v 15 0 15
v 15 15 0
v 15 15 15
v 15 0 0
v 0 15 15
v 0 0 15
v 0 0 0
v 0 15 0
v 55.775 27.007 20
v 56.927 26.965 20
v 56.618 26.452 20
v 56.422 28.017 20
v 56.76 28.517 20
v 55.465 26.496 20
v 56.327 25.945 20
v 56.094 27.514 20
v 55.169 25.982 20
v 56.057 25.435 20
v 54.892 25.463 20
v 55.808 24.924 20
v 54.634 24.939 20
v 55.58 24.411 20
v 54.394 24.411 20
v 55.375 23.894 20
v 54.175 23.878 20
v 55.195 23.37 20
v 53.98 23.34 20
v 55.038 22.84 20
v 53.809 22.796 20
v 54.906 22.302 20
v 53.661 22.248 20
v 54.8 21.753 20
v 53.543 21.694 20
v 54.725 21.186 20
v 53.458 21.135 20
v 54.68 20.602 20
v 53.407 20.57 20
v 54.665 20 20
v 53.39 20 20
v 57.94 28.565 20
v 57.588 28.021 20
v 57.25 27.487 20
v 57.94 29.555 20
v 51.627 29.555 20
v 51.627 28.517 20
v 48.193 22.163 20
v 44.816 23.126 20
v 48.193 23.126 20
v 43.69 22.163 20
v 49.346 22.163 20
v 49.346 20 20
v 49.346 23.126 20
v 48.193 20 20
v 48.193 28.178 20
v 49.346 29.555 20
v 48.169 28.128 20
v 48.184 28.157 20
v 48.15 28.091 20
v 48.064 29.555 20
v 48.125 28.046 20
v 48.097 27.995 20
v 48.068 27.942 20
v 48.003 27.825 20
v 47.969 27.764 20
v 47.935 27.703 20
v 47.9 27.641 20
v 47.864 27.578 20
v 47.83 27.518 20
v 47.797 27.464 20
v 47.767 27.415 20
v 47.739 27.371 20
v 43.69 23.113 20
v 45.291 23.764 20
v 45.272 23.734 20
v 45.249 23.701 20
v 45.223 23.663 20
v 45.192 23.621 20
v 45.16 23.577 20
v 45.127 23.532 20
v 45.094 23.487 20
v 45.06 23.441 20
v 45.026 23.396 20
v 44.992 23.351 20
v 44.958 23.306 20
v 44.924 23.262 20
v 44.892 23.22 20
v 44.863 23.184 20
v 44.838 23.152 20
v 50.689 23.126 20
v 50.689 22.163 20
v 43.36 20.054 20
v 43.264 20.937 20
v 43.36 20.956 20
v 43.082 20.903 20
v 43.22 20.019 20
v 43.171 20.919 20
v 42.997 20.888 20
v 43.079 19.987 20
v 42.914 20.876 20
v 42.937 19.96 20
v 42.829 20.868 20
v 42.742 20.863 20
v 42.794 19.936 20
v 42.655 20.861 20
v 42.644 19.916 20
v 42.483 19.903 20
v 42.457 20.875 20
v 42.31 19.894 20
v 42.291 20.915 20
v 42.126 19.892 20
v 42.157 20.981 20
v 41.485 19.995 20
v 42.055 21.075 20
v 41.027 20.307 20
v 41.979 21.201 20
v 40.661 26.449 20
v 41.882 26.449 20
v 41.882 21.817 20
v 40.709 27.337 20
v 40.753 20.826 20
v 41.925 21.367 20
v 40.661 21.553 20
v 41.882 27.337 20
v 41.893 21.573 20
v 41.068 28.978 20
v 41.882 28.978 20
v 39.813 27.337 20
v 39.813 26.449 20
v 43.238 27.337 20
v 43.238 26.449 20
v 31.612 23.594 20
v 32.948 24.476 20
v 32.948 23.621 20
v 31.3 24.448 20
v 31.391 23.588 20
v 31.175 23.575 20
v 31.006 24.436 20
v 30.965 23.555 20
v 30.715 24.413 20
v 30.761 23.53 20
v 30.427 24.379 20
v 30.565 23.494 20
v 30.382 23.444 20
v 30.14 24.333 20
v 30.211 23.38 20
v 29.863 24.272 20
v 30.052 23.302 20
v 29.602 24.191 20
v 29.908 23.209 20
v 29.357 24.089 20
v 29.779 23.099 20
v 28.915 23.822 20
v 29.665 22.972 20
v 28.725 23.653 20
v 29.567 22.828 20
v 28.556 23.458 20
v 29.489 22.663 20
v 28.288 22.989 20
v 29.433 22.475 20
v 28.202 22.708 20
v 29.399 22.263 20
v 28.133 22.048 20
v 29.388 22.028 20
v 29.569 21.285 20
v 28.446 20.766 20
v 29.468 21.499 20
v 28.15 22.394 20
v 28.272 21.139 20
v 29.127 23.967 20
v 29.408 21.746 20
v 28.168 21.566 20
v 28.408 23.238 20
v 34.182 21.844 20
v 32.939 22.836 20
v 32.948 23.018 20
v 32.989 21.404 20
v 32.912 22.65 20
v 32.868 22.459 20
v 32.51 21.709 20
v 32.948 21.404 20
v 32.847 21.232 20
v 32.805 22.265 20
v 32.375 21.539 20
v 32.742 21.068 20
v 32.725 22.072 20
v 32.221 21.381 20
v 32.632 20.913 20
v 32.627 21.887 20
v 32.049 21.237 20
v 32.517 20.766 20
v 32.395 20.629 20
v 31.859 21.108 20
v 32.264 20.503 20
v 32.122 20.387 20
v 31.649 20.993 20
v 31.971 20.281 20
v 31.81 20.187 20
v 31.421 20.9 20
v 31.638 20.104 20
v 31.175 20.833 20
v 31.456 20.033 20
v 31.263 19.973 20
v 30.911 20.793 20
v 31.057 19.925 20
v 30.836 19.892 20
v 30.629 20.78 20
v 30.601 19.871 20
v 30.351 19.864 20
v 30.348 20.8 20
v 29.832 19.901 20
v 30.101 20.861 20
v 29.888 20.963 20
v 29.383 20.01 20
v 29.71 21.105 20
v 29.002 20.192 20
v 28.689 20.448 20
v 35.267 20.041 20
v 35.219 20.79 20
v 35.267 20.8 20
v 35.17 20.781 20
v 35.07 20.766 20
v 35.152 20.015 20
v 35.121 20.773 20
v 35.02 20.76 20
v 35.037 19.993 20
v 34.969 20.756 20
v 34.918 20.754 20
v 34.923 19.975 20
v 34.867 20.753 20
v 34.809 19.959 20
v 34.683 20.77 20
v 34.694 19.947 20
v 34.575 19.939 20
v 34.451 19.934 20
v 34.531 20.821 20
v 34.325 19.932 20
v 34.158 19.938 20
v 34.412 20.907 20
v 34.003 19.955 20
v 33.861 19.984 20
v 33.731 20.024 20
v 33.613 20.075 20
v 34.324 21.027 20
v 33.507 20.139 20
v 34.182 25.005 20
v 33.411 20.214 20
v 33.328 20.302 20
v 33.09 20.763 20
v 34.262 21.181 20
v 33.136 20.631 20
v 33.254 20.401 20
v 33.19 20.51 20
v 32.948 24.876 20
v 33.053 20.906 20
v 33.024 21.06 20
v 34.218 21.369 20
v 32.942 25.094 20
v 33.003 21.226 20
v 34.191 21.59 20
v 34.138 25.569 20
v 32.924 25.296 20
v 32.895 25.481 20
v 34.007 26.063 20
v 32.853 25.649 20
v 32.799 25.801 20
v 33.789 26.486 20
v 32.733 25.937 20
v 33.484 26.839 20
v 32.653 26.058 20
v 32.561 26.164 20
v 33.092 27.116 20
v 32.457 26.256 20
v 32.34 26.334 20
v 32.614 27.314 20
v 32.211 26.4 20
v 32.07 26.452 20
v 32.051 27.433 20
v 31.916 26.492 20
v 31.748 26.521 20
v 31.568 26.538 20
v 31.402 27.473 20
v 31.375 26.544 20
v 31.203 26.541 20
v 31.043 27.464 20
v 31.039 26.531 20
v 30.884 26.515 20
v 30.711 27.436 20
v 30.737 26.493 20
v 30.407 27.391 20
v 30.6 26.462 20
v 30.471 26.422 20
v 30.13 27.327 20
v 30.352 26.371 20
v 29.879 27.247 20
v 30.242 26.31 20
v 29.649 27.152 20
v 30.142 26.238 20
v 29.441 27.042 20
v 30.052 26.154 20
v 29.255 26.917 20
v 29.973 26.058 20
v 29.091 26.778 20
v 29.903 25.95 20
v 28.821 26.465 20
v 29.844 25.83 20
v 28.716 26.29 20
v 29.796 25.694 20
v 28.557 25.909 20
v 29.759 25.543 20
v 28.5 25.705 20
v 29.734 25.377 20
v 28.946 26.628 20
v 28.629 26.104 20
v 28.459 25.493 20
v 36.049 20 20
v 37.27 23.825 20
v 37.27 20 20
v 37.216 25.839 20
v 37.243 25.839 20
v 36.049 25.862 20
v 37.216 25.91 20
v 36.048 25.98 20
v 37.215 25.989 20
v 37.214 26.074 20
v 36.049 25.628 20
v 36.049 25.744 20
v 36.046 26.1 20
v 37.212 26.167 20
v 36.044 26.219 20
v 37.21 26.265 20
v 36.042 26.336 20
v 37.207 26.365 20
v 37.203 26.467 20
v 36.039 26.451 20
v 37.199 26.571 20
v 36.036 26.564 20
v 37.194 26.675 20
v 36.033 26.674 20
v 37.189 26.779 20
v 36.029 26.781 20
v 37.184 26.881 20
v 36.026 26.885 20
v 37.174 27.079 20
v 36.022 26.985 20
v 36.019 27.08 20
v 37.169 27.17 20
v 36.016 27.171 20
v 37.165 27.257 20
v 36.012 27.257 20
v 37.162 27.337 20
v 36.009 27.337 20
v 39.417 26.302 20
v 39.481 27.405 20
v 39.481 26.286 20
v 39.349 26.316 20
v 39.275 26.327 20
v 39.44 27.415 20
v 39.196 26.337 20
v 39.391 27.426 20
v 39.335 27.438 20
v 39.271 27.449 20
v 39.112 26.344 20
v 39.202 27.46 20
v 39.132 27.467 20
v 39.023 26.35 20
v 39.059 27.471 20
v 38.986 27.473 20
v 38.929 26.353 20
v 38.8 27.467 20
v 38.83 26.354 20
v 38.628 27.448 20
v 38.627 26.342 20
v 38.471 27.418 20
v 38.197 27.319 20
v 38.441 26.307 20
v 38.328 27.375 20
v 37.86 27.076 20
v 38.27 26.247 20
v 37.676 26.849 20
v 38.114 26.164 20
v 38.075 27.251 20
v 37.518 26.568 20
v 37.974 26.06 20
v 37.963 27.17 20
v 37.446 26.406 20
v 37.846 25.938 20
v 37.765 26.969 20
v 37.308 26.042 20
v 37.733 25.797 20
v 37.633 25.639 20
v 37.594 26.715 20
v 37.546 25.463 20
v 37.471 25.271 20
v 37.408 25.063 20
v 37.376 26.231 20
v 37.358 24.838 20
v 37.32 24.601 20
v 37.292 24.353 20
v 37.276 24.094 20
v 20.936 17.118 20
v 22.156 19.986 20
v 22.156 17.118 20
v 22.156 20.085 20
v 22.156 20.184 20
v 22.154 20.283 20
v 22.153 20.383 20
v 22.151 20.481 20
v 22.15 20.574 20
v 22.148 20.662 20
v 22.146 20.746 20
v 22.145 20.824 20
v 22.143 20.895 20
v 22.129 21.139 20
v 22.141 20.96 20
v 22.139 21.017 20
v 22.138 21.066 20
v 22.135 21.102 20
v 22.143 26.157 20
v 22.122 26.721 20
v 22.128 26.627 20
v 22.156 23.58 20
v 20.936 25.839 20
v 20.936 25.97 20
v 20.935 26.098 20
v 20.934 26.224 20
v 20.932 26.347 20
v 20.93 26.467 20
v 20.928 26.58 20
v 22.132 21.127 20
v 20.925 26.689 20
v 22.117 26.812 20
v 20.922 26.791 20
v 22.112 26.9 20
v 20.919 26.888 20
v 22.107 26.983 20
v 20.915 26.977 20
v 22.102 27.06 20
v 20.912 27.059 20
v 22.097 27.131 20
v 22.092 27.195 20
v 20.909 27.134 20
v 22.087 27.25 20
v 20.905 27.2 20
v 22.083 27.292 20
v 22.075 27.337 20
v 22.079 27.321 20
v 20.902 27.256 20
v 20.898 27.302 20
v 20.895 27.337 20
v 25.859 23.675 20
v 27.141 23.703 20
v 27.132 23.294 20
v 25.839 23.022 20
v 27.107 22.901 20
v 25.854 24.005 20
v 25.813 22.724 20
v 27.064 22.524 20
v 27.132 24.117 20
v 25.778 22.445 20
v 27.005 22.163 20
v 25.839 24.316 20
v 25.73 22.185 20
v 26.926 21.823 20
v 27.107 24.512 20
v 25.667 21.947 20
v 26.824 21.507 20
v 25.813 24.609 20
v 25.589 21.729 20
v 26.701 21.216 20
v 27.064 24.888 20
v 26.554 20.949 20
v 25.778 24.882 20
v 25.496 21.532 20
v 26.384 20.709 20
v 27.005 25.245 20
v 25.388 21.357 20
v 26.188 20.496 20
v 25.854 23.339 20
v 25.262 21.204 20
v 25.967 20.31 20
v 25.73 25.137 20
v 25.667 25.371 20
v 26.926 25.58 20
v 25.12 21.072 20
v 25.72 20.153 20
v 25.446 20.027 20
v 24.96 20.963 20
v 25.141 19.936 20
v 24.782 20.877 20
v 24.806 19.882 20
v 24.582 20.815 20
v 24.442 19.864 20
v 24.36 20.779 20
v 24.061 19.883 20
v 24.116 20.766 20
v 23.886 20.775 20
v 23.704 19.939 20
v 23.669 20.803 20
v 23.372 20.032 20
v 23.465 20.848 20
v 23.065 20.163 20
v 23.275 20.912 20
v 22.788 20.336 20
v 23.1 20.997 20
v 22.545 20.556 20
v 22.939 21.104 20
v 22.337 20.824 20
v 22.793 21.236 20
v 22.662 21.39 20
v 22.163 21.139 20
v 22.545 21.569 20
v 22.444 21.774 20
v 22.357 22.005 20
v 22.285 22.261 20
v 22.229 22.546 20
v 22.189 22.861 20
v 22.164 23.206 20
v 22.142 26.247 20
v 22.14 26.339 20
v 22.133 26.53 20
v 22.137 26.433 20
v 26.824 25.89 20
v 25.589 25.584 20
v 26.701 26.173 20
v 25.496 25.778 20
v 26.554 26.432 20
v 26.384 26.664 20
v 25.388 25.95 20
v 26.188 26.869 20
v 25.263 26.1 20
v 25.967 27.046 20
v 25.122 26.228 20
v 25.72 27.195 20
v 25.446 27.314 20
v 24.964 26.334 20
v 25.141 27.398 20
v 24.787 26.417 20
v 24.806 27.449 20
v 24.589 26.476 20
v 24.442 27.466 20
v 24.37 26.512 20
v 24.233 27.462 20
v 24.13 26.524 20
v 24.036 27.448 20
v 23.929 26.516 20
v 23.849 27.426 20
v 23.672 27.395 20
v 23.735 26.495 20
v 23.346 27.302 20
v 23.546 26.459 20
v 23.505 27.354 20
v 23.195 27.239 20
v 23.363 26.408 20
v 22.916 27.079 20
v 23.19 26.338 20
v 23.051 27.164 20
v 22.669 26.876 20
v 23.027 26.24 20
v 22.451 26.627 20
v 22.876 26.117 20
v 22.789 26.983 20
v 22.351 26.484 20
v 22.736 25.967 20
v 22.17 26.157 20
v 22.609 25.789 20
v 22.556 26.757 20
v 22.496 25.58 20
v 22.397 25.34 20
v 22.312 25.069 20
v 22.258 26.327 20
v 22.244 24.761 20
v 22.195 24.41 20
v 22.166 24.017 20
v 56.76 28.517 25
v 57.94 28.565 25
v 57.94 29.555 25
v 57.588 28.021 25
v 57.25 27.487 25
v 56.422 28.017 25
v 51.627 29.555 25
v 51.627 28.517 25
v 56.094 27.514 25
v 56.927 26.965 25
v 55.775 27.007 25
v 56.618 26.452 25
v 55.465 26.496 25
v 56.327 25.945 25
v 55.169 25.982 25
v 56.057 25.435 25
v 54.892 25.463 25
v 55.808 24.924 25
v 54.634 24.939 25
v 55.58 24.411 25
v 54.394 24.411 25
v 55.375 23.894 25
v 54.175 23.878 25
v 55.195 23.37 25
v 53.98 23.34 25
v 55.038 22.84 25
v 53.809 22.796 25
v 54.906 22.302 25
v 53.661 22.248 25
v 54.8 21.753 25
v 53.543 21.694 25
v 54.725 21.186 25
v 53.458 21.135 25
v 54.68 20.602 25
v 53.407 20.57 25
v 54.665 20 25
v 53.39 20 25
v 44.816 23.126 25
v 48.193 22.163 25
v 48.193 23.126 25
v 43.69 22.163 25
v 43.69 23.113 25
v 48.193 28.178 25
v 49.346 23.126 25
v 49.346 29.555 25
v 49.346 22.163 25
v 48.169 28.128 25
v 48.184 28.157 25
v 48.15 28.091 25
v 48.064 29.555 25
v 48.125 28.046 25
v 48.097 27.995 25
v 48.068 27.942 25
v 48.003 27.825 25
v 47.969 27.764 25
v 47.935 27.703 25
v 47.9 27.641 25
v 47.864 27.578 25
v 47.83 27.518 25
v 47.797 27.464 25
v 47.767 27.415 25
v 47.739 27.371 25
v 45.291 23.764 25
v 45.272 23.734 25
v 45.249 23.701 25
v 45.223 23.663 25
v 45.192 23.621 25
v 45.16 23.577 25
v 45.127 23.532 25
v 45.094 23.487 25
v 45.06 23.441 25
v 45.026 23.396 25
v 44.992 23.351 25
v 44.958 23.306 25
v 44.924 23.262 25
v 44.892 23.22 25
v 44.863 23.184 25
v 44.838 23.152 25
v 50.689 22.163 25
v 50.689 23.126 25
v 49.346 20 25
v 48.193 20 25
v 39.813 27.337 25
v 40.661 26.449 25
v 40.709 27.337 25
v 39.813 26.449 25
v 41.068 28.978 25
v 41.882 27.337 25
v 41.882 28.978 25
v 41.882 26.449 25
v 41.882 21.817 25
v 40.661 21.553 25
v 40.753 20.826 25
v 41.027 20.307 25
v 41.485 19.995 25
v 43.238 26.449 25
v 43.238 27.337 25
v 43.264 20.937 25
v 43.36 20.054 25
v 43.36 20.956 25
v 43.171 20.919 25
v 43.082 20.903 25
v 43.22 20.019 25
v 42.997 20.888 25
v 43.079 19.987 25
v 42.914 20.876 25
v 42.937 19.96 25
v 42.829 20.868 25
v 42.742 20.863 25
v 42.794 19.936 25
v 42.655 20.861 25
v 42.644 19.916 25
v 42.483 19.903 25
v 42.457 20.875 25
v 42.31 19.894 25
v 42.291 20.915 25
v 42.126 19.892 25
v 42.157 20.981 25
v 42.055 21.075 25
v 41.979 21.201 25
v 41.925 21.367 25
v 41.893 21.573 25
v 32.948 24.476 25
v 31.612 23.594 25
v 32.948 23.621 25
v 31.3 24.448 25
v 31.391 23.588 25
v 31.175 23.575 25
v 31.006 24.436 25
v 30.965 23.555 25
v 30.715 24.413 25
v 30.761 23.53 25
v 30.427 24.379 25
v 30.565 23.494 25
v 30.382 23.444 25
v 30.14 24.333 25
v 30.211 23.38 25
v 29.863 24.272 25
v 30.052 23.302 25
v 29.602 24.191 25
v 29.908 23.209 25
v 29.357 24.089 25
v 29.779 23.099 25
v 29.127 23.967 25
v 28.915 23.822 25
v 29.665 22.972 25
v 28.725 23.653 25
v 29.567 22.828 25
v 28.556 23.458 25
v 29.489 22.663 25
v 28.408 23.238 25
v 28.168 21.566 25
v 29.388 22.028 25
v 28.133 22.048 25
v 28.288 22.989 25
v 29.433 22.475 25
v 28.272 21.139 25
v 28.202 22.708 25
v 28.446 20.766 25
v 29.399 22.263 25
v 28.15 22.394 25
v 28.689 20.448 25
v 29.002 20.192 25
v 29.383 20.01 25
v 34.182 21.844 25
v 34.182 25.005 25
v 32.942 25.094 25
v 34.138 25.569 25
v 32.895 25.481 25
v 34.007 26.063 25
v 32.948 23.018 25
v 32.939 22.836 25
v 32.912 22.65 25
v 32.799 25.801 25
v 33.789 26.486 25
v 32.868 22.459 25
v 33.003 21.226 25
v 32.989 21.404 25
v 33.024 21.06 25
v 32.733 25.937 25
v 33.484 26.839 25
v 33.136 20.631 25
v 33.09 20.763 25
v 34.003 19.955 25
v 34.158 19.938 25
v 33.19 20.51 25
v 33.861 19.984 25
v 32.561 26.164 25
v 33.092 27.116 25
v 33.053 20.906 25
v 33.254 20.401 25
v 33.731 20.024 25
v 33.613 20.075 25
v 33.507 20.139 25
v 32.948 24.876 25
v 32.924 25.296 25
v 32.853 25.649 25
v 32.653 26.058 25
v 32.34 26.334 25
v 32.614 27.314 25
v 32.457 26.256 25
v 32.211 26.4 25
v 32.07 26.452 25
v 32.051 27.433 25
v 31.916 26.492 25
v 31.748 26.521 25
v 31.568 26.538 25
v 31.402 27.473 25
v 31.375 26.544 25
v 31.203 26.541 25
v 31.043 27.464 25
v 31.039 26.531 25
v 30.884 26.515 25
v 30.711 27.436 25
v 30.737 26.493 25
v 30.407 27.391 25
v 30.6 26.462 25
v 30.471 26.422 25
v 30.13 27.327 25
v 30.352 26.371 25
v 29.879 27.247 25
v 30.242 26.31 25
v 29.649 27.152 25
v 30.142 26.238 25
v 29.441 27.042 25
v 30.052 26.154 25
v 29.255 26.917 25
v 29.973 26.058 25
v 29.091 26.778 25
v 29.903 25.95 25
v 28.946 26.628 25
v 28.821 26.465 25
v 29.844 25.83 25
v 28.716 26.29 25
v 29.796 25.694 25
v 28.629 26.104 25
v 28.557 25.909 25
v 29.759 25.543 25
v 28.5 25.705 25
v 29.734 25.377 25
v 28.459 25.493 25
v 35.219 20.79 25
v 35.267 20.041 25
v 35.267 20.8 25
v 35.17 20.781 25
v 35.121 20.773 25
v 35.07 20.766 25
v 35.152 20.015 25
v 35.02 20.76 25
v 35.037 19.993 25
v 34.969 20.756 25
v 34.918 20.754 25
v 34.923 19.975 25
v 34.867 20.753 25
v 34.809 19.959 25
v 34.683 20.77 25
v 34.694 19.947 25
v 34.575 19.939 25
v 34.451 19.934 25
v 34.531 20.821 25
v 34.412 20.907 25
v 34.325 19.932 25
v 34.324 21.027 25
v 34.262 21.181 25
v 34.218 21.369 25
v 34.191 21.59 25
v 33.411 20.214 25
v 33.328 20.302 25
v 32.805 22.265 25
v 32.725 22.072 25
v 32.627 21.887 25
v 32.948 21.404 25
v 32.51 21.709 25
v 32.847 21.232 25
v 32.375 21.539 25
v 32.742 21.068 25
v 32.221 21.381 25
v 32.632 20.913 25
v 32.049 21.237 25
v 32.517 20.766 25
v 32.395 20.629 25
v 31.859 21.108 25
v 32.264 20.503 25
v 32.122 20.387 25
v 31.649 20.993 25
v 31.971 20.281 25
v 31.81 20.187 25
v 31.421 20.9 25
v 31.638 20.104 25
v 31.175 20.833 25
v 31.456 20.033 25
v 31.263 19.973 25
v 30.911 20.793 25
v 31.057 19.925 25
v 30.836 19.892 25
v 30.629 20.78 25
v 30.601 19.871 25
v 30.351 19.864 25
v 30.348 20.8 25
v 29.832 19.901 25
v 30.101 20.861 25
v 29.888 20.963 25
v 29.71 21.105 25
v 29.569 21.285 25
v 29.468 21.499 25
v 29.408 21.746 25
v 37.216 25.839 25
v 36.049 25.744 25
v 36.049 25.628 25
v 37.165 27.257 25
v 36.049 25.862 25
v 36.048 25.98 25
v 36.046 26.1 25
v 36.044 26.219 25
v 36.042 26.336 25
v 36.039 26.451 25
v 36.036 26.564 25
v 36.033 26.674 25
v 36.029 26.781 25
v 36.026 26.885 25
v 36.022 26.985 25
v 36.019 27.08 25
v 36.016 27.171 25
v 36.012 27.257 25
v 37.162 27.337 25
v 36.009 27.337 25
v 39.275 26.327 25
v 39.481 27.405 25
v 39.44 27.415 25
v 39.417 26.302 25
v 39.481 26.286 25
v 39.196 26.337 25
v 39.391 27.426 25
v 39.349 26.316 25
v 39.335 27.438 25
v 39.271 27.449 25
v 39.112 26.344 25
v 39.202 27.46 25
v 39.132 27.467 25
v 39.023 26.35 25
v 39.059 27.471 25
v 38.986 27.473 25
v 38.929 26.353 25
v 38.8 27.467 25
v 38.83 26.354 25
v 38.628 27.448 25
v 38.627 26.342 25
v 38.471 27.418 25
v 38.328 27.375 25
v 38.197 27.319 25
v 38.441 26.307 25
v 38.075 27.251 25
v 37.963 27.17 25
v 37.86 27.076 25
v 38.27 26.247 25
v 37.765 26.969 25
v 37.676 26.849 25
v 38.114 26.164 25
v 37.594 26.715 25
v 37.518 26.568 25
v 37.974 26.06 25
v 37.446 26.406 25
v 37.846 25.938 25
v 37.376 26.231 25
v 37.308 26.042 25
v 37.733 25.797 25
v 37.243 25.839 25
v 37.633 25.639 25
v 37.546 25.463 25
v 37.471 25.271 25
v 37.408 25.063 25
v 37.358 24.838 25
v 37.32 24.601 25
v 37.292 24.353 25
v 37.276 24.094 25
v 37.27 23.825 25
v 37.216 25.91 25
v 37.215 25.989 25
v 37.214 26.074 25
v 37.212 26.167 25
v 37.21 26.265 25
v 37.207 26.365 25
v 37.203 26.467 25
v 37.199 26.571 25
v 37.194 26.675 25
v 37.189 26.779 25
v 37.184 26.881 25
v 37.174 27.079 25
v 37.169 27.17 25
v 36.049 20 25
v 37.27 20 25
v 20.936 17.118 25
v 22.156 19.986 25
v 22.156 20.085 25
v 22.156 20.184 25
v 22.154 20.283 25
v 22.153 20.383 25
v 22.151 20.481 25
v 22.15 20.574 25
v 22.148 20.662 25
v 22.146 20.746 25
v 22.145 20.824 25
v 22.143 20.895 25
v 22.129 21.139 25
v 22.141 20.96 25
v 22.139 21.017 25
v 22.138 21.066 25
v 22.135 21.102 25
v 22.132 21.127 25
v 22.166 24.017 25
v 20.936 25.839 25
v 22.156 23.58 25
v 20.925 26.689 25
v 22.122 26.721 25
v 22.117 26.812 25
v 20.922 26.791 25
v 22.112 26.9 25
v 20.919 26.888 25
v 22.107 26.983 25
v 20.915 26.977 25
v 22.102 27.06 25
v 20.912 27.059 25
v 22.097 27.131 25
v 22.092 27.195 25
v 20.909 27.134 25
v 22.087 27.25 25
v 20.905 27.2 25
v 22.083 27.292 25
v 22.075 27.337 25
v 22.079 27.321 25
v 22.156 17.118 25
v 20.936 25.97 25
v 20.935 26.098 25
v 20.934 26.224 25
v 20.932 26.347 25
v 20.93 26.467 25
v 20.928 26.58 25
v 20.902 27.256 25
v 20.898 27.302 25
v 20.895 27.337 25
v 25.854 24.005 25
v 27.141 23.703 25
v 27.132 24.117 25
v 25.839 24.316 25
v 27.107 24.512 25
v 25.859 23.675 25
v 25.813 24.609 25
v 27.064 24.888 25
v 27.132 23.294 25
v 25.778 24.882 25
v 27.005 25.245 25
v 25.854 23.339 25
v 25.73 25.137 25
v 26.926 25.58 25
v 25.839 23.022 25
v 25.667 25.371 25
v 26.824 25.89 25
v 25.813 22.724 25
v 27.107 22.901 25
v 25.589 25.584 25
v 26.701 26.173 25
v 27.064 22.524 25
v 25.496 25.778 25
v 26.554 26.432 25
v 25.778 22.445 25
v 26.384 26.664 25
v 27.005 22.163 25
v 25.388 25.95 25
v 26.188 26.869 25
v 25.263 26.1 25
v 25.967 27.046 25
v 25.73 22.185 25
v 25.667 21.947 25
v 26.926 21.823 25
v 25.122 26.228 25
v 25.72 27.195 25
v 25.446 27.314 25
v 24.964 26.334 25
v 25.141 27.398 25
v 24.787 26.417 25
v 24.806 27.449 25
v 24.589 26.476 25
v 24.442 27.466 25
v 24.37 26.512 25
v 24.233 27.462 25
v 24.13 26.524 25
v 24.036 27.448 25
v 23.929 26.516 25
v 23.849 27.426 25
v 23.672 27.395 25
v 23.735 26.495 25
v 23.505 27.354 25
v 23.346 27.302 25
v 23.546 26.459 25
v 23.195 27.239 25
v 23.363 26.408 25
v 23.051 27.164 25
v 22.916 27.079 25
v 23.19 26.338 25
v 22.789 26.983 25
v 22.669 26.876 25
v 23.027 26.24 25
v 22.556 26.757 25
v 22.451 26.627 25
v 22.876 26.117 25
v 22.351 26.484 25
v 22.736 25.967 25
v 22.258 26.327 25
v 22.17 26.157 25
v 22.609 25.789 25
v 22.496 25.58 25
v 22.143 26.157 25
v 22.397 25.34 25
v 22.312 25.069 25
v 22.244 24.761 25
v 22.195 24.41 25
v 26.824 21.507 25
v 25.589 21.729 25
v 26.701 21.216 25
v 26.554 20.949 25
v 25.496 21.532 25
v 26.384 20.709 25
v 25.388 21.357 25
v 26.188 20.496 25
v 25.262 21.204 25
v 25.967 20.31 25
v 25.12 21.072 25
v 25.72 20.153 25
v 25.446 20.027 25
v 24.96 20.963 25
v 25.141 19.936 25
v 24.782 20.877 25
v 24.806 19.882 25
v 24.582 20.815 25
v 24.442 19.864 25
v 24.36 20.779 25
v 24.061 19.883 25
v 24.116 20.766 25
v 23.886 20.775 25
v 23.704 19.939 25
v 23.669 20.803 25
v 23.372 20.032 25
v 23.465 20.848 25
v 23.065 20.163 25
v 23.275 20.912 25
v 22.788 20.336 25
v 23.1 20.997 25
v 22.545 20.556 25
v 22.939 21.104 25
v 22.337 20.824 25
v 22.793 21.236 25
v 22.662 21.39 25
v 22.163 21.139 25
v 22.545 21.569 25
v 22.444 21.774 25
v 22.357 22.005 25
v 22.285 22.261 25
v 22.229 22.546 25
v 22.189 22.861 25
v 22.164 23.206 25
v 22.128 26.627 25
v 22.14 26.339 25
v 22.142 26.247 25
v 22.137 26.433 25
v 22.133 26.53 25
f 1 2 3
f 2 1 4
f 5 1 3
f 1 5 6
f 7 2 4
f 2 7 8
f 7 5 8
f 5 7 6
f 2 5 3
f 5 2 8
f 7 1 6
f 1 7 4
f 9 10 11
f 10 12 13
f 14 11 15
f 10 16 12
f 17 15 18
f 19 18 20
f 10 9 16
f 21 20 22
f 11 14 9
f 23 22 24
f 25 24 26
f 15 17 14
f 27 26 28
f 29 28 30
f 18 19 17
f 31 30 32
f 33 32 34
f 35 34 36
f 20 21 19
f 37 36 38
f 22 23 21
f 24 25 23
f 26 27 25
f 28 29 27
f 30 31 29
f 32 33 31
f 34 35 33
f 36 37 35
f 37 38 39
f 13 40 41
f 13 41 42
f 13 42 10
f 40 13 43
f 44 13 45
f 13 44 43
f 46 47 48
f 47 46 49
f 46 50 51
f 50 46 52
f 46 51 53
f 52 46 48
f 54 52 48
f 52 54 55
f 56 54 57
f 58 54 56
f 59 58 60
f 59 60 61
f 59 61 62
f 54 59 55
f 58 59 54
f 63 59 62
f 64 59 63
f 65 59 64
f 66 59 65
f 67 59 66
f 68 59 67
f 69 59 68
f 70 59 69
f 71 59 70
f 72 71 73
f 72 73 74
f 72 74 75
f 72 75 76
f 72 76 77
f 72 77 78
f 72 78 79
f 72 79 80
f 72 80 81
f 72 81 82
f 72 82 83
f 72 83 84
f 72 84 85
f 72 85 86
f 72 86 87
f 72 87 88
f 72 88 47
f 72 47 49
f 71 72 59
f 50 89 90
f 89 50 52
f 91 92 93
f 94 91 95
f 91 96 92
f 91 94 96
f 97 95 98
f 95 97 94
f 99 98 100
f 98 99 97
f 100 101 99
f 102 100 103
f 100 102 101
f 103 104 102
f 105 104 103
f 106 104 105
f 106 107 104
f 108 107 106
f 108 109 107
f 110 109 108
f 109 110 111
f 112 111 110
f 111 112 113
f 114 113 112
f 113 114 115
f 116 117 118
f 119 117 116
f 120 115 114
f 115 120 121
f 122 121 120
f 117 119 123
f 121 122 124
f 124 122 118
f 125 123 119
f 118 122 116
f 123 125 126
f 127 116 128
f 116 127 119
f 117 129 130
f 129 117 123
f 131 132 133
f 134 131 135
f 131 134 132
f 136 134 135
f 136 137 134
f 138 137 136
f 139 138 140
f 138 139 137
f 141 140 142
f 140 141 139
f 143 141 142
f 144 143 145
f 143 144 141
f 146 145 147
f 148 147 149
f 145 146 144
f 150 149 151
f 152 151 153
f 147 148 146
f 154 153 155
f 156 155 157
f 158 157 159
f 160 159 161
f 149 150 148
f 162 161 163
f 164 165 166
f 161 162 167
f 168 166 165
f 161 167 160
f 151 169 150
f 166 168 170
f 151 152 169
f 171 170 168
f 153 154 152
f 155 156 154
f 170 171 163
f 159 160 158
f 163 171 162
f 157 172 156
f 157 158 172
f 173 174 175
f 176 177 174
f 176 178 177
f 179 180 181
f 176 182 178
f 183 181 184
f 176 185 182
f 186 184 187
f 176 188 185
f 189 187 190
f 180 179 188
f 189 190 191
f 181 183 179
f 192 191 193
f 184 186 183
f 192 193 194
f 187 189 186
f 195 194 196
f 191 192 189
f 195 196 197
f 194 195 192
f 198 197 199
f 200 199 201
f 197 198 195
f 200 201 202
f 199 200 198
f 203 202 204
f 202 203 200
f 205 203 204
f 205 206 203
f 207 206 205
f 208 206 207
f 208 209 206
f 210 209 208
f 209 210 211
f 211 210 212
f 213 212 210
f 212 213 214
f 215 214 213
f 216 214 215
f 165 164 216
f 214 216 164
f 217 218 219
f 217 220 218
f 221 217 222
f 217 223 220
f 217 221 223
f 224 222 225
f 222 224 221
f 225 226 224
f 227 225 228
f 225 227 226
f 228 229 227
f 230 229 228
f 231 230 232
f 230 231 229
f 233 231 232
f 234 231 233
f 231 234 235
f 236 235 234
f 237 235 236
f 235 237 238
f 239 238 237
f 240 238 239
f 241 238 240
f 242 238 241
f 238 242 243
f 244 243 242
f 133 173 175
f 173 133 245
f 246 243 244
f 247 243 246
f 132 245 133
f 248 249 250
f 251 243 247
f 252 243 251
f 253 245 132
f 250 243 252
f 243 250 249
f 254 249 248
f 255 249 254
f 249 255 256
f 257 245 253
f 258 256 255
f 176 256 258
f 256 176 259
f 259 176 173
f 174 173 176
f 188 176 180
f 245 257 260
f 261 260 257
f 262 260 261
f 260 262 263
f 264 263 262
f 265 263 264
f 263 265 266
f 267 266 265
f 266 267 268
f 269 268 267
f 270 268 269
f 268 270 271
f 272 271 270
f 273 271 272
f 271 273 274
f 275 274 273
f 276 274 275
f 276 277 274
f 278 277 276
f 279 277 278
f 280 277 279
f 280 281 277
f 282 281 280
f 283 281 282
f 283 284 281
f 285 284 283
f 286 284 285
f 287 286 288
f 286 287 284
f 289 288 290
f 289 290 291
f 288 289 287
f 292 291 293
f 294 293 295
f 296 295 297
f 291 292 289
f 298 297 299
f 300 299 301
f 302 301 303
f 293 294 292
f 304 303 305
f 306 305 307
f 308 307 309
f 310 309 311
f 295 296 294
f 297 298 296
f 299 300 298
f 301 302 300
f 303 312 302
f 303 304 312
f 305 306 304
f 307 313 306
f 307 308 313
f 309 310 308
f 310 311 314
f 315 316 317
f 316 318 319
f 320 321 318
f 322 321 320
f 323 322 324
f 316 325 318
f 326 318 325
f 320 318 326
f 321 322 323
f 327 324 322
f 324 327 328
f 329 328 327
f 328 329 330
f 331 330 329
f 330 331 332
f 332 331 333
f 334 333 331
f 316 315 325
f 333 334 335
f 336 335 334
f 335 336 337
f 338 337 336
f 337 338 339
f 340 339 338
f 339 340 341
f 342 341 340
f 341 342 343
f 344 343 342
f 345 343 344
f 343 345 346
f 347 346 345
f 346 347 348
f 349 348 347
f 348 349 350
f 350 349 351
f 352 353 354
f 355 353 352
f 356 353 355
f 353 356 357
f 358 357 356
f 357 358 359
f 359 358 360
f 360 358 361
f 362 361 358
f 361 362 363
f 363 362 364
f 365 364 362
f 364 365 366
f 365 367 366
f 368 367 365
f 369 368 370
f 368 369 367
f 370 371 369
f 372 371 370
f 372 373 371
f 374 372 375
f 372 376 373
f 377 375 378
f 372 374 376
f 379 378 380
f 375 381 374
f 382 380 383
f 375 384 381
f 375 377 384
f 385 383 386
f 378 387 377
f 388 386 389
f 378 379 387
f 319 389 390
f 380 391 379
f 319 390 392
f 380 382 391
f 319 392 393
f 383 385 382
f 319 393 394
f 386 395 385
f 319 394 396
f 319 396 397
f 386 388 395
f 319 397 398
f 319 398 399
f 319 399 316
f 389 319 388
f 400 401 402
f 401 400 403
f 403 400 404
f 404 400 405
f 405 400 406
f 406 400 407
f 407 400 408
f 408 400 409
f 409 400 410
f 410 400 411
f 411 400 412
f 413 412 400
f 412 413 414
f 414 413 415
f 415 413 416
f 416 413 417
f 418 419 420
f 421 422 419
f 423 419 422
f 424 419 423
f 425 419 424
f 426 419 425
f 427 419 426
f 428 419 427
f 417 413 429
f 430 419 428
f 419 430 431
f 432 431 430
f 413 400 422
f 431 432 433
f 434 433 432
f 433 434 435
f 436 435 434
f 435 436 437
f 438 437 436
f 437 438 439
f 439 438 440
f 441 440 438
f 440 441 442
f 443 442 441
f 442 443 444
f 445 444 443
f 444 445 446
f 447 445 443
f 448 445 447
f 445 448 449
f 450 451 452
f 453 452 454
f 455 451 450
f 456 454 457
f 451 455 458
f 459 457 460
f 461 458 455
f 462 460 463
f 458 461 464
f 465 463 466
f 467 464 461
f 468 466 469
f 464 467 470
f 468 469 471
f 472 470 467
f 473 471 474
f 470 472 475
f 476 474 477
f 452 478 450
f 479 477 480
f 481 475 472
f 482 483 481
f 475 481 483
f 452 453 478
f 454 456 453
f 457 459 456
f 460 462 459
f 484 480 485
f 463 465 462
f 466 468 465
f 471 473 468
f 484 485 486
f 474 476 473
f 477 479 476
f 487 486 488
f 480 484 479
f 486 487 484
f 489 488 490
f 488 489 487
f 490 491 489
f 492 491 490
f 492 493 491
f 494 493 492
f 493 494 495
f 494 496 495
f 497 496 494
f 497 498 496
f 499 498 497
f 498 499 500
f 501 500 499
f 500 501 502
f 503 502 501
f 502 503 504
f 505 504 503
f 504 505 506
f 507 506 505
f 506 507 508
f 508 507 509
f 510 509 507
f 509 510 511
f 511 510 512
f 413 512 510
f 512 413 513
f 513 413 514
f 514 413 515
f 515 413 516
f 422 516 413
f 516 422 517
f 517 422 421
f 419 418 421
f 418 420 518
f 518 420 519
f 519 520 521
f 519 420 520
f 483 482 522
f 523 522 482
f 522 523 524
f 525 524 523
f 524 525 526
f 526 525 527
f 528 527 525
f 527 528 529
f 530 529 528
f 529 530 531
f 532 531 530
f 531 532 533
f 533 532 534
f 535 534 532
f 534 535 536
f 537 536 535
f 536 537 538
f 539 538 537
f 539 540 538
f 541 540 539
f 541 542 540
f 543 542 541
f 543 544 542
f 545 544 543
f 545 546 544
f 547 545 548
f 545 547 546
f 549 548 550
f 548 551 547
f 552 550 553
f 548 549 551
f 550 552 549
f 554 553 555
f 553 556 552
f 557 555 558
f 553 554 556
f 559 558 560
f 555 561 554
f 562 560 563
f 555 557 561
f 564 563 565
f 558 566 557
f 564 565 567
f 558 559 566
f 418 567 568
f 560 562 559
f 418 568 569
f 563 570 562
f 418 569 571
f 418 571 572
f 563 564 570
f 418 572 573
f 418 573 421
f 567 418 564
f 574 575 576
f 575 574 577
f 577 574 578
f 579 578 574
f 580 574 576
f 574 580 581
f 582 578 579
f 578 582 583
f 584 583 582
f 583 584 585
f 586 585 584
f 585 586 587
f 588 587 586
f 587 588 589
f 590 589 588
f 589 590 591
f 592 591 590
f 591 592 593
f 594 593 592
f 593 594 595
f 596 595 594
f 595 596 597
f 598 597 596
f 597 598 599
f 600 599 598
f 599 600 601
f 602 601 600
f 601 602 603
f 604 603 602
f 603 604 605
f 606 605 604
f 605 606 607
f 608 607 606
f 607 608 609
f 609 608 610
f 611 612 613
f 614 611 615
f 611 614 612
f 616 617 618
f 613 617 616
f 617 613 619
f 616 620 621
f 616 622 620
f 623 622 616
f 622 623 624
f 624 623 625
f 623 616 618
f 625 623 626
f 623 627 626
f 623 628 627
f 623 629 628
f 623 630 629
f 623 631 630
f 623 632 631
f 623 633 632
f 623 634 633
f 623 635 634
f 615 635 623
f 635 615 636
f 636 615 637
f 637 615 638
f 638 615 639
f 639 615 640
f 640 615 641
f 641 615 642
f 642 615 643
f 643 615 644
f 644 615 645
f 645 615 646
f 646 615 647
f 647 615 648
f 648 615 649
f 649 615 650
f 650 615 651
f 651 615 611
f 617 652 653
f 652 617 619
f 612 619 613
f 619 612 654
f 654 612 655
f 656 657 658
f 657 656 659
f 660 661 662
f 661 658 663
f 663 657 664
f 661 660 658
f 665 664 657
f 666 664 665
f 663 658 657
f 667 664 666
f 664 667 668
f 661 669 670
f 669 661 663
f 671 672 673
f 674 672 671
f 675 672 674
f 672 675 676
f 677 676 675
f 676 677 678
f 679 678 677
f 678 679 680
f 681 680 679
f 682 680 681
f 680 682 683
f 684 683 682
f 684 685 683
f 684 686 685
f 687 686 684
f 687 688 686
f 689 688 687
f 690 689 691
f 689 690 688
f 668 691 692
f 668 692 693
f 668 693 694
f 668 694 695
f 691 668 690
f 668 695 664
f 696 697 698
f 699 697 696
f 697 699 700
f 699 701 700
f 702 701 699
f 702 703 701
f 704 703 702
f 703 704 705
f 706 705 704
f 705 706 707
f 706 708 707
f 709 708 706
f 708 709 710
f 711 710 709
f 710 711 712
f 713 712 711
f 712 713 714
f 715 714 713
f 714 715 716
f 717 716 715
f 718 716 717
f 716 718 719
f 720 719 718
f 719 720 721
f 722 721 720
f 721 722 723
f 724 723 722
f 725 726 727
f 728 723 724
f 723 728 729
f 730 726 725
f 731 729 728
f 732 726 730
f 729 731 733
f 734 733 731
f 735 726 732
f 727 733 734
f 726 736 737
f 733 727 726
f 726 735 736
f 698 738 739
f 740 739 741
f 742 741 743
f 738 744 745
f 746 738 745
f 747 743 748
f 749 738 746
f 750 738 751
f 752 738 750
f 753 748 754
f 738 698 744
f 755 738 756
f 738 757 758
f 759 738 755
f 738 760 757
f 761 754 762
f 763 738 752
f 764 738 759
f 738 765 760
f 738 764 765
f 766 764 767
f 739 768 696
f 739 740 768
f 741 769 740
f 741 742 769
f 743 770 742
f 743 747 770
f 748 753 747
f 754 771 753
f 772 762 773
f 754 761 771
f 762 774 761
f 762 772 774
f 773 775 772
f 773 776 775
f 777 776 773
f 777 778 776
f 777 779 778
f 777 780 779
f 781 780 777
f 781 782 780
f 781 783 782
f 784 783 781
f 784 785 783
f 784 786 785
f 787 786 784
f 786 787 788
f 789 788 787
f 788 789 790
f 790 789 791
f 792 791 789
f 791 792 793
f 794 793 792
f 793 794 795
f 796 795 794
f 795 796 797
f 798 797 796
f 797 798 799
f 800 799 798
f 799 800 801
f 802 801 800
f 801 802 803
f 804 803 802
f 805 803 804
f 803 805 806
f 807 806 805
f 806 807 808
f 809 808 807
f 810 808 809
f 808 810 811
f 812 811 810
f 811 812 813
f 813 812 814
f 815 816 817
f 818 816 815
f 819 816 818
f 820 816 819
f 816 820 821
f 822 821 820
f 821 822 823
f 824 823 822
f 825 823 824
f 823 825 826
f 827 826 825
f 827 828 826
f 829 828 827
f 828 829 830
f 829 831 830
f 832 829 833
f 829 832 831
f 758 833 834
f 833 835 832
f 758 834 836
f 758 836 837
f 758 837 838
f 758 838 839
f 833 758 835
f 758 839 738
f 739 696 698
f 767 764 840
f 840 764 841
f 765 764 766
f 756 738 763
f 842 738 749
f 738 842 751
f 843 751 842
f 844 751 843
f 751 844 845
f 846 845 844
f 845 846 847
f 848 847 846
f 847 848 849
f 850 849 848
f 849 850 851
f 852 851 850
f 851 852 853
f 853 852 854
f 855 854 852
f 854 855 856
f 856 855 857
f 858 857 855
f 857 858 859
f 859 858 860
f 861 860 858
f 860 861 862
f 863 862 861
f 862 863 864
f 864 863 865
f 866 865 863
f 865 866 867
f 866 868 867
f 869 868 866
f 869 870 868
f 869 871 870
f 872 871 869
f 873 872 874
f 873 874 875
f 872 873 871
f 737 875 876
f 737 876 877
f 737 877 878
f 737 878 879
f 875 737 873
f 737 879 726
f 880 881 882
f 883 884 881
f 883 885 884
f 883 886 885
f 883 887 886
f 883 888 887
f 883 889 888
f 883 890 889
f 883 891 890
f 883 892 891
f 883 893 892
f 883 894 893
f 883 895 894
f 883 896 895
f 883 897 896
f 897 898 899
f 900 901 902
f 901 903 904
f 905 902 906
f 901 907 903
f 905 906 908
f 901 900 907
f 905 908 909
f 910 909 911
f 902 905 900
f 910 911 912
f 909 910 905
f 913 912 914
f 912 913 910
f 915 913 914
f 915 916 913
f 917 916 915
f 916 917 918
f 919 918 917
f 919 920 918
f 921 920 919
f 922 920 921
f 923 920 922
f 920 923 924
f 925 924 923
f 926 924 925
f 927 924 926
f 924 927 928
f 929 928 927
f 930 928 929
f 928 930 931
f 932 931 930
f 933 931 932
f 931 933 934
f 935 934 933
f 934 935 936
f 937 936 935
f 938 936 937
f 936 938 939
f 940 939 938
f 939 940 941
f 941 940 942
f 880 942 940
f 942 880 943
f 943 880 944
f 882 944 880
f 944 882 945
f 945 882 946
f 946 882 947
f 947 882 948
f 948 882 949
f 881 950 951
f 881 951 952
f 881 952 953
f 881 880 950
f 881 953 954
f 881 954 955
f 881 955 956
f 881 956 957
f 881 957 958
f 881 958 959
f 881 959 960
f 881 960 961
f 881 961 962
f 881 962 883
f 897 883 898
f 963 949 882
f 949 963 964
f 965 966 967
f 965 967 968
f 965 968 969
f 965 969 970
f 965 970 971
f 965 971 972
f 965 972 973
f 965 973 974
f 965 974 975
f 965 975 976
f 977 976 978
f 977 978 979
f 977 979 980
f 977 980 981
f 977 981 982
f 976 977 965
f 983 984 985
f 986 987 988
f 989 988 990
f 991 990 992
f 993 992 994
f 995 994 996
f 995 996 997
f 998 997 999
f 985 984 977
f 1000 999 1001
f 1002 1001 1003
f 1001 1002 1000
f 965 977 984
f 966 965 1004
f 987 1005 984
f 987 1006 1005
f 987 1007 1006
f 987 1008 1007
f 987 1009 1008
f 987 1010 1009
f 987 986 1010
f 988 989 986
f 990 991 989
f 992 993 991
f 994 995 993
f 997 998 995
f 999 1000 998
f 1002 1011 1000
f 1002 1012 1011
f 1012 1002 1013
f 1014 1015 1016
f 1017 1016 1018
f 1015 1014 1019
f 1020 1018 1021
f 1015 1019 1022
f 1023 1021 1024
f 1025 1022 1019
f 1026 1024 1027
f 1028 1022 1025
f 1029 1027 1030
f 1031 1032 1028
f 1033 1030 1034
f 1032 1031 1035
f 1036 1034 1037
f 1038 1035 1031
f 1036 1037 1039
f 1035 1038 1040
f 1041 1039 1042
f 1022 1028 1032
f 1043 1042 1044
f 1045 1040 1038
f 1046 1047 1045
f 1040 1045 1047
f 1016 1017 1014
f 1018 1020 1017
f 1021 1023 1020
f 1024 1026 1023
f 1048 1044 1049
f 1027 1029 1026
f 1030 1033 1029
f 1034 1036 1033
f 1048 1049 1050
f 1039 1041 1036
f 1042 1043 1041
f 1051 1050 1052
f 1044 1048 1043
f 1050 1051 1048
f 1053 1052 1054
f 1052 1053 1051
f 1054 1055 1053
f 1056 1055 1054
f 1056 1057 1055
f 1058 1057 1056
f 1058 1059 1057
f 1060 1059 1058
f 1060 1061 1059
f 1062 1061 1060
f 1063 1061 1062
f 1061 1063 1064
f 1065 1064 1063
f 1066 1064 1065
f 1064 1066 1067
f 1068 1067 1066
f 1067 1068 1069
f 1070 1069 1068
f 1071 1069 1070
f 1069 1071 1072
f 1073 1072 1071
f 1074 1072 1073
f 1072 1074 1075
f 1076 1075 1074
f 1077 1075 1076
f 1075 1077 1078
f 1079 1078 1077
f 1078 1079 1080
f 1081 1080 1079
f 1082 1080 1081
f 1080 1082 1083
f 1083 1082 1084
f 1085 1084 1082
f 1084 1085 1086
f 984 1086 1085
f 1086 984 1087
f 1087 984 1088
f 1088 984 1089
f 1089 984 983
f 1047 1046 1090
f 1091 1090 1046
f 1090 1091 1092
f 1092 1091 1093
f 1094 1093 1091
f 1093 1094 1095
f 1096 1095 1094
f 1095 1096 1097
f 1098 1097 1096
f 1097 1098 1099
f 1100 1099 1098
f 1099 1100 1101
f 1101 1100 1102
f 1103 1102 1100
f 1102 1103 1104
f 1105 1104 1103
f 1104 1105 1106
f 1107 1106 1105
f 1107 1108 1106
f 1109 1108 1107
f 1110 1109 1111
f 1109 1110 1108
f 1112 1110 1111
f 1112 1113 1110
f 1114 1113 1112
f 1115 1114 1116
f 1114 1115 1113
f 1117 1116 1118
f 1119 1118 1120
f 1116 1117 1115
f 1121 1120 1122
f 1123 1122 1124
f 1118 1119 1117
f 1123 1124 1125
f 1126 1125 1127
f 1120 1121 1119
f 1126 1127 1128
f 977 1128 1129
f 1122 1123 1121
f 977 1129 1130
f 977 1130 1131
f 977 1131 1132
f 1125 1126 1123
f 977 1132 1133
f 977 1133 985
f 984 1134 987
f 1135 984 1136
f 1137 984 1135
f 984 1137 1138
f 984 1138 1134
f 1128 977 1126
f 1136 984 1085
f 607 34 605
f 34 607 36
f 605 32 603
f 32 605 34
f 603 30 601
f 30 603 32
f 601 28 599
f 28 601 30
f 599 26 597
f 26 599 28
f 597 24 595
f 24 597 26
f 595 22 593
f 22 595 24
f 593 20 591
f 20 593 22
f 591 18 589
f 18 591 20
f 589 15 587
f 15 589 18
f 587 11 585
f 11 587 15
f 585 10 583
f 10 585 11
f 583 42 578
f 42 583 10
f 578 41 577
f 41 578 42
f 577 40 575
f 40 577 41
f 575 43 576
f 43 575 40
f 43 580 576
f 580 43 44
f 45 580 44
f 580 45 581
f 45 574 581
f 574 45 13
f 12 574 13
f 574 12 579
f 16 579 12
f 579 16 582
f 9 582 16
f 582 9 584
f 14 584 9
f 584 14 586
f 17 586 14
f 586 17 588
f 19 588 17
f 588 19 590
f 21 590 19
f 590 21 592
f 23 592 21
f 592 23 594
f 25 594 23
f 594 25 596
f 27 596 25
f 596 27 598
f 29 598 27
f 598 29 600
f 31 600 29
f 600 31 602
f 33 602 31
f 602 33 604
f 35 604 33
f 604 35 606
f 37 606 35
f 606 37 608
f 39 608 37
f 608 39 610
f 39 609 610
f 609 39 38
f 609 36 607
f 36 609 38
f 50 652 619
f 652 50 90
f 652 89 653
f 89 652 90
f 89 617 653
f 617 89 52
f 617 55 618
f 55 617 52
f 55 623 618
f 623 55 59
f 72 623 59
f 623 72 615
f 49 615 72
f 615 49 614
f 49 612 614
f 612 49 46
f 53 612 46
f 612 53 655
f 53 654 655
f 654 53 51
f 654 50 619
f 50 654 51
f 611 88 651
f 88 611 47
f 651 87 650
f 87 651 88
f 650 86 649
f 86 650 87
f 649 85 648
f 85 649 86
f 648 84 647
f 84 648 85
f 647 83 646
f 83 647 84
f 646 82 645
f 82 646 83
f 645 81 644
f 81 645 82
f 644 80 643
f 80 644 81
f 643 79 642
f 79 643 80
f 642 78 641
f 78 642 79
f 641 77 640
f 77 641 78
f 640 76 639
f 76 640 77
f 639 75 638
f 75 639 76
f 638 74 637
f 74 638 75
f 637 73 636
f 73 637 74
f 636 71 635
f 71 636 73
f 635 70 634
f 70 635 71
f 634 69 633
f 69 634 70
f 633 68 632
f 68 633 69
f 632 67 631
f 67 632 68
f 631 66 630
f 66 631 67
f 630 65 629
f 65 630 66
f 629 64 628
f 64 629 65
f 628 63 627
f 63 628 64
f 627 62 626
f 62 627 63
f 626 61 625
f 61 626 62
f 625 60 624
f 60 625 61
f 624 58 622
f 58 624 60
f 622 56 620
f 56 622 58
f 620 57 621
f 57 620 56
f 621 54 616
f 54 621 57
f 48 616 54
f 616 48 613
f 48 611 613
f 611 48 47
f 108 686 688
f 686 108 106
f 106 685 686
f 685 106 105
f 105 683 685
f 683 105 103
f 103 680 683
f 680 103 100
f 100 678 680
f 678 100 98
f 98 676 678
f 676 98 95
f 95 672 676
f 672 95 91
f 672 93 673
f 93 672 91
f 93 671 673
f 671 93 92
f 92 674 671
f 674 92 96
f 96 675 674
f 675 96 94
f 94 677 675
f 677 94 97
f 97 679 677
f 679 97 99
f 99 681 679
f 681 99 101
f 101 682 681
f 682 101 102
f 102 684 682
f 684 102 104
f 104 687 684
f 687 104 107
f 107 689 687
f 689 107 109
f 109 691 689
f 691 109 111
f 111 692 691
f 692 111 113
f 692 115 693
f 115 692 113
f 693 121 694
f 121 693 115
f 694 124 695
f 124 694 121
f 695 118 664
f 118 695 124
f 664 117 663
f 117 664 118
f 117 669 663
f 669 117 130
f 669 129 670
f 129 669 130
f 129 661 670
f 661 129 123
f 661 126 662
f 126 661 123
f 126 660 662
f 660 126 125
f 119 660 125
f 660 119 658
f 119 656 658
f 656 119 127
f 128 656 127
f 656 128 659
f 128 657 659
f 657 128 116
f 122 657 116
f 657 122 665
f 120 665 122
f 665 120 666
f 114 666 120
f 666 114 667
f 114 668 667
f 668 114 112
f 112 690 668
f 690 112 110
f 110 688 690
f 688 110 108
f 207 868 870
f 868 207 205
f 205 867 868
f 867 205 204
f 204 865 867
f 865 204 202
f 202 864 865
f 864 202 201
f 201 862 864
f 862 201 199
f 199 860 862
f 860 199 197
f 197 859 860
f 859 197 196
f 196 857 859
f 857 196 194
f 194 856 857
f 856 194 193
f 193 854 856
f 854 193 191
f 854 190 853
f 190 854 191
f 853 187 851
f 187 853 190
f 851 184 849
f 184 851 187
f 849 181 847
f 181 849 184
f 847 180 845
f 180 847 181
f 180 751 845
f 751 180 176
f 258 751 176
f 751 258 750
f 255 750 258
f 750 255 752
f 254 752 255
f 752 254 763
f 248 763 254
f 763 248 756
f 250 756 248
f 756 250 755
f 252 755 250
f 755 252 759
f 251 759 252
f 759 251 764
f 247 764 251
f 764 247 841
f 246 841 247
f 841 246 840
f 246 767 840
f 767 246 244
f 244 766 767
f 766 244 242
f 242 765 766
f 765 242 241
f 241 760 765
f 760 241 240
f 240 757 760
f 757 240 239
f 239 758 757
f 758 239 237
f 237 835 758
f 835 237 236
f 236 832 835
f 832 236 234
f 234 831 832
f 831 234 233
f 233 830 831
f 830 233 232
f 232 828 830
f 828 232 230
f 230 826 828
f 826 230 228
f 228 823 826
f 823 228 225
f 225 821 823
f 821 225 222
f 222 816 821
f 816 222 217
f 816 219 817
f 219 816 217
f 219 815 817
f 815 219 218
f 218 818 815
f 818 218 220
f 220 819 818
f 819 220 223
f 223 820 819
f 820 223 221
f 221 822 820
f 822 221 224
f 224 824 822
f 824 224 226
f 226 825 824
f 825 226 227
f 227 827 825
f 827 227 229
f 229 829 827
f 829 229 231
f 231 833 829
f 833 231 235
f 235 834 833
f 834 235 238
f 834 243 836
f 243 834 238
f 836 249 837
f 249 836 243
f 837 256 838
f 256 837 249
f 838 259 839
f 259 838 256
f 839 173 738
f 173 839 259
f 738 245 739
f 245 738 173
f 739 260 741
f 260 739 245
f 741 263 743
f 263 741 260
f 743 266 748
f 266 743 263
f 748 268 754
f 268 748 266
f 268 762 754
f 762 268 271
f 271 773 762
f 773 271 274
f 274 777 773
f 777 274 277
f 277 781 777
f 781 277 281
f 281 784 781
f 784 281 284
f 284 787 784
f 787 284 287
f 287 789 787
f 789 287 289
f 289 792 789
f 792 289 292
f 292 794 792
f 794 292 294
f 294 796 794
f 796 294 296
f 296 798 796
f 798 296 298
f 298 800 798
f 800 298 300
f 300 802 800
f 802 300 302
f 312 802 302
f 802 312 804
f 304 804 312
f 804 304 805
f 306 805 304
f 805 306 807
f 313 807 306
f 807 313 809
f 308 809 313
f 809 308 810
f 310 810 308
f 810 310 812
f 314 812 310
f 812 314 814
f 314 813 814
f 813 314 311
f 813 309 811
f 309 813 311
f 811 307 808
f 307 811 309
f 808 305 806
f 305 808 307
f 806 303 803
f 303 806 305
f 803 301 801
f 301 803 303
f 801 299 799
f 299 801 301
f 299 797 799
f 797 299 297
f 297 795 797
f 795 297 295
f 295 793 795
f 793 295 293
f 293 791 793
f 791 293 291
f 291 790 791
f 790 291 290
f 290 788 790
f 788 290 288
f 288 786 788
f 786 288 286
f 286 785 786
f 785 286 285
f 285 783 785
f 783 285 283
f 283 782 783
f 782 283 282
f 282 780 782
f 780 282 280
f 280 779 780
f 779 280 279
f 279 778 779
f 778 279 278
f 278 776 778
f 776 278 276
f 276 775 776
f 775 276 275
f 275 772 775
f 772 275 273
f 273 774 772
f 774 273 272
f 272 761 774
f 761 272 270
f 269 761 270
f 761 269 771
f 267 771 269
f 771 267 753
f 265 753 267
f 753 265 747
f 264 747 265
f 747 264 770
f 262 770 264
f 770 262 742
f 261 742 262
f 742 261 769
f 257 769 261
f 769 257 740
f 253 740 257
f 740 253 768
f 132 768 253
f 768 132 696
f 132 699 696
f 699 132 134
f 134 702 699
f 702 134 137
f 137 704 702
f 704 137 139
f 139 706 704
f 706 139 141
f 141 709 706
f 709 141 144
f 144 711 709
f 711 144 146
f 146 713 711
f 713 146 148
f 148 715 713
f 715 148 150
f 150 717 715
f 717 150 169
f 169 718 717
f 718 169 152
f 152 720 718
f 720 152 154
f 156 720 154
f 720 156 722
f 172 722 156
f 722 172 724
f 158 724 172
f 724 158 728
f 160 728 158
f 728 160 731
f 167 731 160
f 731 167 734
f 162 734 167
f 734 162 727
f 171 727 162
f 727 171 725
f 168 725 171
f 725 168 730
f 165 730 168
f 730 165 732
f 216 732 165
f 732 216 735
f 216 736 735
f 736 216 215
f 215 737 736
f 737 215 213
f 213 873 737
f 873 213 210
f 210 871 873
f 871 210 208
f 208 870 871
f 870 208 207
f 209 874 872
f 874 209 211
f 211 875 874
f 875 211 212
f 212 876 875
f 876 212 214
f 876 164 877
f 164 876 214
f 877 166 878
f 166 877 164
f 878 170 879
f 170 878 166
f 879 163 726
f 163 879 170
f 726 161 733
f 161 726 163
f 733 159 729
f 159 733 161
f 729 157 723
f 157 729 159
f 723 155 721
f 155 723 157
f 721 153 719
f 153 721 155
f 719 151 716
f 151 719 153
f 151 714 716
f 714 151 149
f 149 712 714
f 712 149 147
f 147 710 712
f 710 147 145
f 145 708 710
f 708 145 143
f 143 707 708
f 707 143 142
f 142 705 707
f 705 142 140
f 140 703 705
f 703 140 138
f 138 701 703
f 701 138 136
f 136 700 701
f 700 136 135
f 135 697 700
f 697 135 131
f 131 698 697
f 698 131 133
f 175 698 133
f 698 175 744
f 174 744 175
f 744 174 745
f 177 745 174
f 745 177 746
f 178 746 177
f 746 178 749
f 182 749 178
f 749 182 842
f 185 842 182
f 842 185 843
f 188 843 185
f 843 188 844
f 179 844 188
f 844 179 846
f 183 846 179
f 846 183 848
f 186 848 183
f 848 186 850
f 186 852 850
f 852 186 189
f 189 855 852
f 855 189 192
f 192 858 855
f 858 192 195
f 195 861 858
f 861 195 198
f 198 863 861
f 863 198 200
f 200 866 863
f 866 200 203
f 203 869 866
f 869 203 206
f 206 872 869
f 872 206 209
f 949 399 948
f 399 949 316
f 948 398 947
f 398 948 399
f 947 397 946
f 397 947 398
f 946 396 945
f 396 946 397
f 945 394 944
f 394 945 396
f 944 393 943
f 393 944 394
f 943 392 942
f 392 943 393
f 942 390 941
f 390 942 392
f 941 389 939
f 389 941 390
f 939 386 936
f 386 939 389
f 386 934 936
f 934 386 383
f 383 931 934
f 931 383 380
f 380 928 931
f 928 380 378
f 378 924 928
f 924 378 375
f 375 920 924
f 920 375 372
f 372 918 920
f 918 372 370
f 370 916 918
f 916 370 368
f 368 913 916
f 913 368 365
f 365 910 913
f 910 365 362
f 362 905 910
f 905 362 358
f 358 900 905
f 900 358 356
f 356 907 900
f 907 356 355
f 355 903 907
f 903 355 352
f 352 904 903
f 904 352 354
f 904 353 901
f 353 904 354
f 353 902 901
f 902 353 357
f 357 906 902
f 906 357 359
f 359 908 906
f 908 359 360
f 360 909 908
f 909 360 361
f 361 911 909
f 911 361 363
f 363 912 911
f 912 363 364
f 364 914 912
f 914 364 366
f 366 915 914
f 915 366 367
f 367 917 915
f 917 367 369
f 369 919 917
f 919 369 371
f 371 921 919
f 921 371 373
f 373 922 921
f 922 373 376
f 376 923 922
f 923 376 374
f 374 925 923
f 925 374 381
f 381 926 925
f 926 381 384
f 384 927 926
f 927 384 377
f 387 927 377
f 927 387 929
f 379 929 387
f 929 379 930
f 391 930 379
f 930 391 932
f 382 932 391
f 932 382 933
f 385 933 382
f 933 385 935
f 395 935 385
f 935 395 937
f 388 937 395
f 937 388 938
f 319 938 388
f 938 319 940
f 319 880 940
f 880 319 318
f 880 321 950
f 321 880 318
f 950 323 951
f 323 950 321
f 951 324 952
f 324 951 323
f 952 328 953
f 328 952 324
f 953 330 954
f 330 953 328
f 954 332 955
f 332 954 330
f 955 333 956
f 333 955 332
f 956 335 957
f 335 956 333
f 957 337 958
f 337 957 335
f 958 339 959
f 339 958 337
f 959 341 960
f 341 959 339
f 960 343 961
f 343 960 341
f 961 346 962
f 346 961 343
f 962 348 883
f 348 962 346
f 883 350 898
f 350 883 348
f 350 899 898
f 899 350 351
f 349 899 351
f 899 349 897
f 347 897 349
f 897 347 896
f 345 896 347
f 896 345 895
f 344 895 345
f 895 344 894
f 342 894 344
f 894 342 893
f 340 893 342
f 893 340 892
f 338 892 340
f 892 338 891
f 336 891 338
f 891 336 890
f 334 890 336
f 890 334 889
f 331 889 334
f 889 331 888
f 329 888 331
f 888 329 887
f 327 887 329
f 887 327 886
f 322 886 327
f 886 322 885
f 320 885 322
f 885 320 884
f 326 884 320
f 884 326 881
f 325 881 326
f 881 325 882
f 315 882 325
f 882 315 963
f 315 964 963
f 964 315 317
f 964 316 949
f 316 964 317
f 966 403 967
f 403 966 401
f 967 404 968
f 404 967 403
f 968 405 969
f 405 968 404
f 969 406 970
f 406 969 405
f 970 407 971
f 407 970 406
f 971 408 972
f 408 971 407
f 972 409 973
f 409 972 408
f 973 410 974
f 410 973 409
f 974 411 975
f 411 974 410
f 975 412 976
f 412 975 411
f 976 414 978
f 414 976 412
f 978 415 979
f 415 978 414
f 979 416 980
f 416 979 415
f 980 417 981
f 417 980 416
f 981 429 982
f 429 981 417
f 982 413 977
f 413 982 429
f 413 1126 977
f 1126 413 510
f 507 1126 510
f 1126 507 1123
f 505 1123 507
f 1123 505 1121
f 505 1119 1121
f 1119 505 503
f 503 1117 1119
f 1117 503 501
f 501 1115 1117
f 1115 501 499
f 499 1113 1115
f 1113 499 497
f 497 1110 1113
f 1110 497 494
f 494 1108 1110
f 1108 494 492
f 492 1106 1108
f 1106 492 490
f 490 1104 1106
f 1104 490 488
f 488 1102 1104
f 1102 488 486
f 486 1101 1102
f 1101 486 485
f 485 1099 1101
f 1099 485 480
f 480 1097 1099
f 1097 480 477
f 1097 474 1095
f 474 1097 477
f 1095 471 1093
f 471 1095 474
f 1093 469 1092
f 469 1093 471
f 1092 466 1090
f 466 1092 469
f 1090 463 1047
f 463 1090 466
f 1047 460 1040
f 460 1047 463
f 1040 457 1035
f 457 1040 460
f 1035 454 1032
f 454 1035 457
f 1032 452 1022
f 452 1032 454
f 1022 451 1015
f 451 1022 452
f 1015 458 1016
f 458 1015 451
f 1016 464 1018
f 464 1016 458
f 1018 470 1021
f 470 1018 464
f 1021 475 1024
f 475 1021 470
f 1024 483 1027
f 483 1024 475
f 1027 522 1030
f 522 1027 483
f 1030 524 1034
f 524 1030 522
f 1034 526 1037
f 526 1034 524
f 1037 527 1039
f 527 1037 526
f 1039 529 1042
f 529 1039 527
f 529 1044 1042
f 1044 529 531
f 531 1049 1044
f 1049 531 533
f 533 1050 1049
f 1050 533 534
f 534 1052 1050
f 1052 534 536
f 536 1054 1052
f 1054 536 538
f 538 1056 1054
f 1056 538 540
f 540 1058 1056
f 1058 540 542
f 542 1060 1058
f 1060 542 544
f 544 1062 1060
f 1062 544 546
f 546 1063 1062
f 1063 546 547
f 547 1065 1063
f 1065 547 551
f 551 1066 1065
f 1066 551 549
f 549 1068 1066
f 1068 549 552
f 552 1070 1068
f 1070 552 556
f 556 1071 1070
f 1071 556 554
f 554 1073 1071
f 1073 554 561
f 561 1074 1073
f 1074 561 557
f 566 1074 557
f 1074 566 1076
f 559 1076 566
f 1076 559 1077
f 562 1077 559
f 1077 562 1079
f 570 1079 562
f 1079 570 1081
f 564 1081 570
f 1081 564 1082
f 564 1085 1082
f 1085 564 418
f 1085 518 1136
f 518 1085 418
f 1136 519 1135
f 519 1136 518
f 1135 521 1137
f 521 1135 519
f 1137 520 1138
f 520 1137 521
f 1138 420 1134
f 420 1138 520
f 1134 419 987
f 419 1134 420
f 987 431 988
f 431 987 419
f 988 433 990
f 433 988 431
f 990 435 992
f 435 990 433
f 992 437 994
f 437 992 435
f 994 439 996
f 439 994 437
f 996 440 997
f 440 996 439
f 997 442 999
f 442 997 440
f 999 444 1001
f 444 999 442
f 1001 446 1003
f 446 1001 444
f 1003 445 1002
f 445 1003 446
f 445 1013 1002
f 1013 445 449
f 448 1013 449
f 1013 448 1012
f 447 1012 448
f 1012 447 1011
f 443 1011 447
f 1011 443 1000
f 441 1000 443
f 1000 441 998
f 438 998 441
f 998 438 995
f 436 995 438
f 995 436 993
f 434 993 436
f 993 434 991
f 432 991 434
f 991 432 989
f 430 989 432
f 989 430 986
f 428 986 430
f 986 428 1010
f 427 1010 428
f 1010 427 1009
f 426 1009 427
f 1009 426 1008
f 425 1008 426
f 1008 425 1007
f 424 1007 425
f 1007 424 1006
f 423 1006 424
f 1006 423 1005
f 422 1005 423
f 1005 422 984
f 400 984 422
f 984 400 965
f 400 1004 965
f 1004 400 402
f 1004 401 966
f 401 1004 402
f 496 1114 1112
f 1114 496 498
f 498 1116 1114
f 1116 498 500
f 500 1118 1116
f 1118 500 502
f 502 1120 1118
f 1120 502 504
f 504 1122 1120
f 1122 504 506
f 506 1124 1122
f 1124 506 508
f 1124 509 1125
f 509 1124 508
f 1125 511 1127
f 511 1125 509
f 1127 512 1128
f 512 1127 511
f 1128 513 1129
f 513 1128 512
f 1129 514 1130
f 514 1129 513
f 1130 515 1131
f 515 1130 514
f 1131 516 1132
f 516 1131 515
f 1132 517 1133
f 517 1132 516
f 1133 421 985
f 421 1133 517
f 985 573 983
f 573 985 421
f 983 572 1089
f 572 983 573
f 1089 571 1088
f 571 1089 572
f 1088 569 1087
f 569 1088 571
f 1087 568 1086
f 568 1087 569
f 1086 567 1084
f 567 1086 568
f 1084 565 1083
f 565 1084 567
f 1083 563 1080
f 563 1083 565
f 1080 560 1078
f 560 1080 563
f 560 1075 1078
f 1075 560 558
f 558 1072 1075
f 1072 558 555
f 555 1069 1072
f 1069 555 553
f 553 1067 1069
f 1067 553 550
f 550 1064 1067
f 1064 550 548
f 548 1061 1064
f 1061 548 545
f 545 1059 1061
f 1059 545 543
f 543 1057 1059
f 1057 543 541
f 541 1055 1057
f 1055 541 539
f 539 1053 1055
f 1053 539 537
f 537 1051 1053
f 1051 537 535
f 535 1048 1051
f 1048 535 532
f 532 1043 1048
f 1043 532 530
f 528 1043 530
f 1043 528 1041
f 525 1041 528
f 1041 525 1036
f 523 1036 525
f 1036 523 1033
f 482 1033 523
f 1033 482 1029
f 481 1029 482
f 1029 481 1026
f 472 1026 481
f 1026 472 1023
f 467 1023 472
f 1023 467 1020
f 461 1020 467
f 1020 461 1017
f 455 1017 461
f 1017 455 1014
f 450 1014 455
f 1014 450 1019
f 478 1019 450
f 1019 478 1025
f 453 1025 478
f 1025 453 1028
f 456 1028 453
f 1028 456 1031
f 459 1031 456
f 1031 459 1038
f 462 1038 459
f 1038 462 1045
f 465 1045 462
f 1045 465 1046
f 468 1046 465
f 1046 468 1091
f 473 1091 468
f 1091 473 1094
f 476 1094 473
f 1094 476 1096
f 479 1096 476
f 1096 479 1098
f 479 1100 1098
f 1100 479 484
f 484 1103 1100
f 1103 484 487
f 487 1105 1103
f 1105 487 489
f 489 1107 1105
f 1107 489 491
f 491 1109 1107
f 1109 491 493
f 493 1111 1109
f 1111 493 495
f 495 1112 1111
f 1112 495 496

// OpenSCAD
//[CUSTOMIZATION]
// X Dimension
xdim=15;
// Y Dimension
ydim=13;
// Z Dimension
zdim=7;
// Message
txt="part47";
module __END_CUSTOMIZATIONS () {}
cube(xdim,ydim,zdim);
translate([20,20,20]) { linear_extrude(5) text(txt, font="Liberation Sans"); }
